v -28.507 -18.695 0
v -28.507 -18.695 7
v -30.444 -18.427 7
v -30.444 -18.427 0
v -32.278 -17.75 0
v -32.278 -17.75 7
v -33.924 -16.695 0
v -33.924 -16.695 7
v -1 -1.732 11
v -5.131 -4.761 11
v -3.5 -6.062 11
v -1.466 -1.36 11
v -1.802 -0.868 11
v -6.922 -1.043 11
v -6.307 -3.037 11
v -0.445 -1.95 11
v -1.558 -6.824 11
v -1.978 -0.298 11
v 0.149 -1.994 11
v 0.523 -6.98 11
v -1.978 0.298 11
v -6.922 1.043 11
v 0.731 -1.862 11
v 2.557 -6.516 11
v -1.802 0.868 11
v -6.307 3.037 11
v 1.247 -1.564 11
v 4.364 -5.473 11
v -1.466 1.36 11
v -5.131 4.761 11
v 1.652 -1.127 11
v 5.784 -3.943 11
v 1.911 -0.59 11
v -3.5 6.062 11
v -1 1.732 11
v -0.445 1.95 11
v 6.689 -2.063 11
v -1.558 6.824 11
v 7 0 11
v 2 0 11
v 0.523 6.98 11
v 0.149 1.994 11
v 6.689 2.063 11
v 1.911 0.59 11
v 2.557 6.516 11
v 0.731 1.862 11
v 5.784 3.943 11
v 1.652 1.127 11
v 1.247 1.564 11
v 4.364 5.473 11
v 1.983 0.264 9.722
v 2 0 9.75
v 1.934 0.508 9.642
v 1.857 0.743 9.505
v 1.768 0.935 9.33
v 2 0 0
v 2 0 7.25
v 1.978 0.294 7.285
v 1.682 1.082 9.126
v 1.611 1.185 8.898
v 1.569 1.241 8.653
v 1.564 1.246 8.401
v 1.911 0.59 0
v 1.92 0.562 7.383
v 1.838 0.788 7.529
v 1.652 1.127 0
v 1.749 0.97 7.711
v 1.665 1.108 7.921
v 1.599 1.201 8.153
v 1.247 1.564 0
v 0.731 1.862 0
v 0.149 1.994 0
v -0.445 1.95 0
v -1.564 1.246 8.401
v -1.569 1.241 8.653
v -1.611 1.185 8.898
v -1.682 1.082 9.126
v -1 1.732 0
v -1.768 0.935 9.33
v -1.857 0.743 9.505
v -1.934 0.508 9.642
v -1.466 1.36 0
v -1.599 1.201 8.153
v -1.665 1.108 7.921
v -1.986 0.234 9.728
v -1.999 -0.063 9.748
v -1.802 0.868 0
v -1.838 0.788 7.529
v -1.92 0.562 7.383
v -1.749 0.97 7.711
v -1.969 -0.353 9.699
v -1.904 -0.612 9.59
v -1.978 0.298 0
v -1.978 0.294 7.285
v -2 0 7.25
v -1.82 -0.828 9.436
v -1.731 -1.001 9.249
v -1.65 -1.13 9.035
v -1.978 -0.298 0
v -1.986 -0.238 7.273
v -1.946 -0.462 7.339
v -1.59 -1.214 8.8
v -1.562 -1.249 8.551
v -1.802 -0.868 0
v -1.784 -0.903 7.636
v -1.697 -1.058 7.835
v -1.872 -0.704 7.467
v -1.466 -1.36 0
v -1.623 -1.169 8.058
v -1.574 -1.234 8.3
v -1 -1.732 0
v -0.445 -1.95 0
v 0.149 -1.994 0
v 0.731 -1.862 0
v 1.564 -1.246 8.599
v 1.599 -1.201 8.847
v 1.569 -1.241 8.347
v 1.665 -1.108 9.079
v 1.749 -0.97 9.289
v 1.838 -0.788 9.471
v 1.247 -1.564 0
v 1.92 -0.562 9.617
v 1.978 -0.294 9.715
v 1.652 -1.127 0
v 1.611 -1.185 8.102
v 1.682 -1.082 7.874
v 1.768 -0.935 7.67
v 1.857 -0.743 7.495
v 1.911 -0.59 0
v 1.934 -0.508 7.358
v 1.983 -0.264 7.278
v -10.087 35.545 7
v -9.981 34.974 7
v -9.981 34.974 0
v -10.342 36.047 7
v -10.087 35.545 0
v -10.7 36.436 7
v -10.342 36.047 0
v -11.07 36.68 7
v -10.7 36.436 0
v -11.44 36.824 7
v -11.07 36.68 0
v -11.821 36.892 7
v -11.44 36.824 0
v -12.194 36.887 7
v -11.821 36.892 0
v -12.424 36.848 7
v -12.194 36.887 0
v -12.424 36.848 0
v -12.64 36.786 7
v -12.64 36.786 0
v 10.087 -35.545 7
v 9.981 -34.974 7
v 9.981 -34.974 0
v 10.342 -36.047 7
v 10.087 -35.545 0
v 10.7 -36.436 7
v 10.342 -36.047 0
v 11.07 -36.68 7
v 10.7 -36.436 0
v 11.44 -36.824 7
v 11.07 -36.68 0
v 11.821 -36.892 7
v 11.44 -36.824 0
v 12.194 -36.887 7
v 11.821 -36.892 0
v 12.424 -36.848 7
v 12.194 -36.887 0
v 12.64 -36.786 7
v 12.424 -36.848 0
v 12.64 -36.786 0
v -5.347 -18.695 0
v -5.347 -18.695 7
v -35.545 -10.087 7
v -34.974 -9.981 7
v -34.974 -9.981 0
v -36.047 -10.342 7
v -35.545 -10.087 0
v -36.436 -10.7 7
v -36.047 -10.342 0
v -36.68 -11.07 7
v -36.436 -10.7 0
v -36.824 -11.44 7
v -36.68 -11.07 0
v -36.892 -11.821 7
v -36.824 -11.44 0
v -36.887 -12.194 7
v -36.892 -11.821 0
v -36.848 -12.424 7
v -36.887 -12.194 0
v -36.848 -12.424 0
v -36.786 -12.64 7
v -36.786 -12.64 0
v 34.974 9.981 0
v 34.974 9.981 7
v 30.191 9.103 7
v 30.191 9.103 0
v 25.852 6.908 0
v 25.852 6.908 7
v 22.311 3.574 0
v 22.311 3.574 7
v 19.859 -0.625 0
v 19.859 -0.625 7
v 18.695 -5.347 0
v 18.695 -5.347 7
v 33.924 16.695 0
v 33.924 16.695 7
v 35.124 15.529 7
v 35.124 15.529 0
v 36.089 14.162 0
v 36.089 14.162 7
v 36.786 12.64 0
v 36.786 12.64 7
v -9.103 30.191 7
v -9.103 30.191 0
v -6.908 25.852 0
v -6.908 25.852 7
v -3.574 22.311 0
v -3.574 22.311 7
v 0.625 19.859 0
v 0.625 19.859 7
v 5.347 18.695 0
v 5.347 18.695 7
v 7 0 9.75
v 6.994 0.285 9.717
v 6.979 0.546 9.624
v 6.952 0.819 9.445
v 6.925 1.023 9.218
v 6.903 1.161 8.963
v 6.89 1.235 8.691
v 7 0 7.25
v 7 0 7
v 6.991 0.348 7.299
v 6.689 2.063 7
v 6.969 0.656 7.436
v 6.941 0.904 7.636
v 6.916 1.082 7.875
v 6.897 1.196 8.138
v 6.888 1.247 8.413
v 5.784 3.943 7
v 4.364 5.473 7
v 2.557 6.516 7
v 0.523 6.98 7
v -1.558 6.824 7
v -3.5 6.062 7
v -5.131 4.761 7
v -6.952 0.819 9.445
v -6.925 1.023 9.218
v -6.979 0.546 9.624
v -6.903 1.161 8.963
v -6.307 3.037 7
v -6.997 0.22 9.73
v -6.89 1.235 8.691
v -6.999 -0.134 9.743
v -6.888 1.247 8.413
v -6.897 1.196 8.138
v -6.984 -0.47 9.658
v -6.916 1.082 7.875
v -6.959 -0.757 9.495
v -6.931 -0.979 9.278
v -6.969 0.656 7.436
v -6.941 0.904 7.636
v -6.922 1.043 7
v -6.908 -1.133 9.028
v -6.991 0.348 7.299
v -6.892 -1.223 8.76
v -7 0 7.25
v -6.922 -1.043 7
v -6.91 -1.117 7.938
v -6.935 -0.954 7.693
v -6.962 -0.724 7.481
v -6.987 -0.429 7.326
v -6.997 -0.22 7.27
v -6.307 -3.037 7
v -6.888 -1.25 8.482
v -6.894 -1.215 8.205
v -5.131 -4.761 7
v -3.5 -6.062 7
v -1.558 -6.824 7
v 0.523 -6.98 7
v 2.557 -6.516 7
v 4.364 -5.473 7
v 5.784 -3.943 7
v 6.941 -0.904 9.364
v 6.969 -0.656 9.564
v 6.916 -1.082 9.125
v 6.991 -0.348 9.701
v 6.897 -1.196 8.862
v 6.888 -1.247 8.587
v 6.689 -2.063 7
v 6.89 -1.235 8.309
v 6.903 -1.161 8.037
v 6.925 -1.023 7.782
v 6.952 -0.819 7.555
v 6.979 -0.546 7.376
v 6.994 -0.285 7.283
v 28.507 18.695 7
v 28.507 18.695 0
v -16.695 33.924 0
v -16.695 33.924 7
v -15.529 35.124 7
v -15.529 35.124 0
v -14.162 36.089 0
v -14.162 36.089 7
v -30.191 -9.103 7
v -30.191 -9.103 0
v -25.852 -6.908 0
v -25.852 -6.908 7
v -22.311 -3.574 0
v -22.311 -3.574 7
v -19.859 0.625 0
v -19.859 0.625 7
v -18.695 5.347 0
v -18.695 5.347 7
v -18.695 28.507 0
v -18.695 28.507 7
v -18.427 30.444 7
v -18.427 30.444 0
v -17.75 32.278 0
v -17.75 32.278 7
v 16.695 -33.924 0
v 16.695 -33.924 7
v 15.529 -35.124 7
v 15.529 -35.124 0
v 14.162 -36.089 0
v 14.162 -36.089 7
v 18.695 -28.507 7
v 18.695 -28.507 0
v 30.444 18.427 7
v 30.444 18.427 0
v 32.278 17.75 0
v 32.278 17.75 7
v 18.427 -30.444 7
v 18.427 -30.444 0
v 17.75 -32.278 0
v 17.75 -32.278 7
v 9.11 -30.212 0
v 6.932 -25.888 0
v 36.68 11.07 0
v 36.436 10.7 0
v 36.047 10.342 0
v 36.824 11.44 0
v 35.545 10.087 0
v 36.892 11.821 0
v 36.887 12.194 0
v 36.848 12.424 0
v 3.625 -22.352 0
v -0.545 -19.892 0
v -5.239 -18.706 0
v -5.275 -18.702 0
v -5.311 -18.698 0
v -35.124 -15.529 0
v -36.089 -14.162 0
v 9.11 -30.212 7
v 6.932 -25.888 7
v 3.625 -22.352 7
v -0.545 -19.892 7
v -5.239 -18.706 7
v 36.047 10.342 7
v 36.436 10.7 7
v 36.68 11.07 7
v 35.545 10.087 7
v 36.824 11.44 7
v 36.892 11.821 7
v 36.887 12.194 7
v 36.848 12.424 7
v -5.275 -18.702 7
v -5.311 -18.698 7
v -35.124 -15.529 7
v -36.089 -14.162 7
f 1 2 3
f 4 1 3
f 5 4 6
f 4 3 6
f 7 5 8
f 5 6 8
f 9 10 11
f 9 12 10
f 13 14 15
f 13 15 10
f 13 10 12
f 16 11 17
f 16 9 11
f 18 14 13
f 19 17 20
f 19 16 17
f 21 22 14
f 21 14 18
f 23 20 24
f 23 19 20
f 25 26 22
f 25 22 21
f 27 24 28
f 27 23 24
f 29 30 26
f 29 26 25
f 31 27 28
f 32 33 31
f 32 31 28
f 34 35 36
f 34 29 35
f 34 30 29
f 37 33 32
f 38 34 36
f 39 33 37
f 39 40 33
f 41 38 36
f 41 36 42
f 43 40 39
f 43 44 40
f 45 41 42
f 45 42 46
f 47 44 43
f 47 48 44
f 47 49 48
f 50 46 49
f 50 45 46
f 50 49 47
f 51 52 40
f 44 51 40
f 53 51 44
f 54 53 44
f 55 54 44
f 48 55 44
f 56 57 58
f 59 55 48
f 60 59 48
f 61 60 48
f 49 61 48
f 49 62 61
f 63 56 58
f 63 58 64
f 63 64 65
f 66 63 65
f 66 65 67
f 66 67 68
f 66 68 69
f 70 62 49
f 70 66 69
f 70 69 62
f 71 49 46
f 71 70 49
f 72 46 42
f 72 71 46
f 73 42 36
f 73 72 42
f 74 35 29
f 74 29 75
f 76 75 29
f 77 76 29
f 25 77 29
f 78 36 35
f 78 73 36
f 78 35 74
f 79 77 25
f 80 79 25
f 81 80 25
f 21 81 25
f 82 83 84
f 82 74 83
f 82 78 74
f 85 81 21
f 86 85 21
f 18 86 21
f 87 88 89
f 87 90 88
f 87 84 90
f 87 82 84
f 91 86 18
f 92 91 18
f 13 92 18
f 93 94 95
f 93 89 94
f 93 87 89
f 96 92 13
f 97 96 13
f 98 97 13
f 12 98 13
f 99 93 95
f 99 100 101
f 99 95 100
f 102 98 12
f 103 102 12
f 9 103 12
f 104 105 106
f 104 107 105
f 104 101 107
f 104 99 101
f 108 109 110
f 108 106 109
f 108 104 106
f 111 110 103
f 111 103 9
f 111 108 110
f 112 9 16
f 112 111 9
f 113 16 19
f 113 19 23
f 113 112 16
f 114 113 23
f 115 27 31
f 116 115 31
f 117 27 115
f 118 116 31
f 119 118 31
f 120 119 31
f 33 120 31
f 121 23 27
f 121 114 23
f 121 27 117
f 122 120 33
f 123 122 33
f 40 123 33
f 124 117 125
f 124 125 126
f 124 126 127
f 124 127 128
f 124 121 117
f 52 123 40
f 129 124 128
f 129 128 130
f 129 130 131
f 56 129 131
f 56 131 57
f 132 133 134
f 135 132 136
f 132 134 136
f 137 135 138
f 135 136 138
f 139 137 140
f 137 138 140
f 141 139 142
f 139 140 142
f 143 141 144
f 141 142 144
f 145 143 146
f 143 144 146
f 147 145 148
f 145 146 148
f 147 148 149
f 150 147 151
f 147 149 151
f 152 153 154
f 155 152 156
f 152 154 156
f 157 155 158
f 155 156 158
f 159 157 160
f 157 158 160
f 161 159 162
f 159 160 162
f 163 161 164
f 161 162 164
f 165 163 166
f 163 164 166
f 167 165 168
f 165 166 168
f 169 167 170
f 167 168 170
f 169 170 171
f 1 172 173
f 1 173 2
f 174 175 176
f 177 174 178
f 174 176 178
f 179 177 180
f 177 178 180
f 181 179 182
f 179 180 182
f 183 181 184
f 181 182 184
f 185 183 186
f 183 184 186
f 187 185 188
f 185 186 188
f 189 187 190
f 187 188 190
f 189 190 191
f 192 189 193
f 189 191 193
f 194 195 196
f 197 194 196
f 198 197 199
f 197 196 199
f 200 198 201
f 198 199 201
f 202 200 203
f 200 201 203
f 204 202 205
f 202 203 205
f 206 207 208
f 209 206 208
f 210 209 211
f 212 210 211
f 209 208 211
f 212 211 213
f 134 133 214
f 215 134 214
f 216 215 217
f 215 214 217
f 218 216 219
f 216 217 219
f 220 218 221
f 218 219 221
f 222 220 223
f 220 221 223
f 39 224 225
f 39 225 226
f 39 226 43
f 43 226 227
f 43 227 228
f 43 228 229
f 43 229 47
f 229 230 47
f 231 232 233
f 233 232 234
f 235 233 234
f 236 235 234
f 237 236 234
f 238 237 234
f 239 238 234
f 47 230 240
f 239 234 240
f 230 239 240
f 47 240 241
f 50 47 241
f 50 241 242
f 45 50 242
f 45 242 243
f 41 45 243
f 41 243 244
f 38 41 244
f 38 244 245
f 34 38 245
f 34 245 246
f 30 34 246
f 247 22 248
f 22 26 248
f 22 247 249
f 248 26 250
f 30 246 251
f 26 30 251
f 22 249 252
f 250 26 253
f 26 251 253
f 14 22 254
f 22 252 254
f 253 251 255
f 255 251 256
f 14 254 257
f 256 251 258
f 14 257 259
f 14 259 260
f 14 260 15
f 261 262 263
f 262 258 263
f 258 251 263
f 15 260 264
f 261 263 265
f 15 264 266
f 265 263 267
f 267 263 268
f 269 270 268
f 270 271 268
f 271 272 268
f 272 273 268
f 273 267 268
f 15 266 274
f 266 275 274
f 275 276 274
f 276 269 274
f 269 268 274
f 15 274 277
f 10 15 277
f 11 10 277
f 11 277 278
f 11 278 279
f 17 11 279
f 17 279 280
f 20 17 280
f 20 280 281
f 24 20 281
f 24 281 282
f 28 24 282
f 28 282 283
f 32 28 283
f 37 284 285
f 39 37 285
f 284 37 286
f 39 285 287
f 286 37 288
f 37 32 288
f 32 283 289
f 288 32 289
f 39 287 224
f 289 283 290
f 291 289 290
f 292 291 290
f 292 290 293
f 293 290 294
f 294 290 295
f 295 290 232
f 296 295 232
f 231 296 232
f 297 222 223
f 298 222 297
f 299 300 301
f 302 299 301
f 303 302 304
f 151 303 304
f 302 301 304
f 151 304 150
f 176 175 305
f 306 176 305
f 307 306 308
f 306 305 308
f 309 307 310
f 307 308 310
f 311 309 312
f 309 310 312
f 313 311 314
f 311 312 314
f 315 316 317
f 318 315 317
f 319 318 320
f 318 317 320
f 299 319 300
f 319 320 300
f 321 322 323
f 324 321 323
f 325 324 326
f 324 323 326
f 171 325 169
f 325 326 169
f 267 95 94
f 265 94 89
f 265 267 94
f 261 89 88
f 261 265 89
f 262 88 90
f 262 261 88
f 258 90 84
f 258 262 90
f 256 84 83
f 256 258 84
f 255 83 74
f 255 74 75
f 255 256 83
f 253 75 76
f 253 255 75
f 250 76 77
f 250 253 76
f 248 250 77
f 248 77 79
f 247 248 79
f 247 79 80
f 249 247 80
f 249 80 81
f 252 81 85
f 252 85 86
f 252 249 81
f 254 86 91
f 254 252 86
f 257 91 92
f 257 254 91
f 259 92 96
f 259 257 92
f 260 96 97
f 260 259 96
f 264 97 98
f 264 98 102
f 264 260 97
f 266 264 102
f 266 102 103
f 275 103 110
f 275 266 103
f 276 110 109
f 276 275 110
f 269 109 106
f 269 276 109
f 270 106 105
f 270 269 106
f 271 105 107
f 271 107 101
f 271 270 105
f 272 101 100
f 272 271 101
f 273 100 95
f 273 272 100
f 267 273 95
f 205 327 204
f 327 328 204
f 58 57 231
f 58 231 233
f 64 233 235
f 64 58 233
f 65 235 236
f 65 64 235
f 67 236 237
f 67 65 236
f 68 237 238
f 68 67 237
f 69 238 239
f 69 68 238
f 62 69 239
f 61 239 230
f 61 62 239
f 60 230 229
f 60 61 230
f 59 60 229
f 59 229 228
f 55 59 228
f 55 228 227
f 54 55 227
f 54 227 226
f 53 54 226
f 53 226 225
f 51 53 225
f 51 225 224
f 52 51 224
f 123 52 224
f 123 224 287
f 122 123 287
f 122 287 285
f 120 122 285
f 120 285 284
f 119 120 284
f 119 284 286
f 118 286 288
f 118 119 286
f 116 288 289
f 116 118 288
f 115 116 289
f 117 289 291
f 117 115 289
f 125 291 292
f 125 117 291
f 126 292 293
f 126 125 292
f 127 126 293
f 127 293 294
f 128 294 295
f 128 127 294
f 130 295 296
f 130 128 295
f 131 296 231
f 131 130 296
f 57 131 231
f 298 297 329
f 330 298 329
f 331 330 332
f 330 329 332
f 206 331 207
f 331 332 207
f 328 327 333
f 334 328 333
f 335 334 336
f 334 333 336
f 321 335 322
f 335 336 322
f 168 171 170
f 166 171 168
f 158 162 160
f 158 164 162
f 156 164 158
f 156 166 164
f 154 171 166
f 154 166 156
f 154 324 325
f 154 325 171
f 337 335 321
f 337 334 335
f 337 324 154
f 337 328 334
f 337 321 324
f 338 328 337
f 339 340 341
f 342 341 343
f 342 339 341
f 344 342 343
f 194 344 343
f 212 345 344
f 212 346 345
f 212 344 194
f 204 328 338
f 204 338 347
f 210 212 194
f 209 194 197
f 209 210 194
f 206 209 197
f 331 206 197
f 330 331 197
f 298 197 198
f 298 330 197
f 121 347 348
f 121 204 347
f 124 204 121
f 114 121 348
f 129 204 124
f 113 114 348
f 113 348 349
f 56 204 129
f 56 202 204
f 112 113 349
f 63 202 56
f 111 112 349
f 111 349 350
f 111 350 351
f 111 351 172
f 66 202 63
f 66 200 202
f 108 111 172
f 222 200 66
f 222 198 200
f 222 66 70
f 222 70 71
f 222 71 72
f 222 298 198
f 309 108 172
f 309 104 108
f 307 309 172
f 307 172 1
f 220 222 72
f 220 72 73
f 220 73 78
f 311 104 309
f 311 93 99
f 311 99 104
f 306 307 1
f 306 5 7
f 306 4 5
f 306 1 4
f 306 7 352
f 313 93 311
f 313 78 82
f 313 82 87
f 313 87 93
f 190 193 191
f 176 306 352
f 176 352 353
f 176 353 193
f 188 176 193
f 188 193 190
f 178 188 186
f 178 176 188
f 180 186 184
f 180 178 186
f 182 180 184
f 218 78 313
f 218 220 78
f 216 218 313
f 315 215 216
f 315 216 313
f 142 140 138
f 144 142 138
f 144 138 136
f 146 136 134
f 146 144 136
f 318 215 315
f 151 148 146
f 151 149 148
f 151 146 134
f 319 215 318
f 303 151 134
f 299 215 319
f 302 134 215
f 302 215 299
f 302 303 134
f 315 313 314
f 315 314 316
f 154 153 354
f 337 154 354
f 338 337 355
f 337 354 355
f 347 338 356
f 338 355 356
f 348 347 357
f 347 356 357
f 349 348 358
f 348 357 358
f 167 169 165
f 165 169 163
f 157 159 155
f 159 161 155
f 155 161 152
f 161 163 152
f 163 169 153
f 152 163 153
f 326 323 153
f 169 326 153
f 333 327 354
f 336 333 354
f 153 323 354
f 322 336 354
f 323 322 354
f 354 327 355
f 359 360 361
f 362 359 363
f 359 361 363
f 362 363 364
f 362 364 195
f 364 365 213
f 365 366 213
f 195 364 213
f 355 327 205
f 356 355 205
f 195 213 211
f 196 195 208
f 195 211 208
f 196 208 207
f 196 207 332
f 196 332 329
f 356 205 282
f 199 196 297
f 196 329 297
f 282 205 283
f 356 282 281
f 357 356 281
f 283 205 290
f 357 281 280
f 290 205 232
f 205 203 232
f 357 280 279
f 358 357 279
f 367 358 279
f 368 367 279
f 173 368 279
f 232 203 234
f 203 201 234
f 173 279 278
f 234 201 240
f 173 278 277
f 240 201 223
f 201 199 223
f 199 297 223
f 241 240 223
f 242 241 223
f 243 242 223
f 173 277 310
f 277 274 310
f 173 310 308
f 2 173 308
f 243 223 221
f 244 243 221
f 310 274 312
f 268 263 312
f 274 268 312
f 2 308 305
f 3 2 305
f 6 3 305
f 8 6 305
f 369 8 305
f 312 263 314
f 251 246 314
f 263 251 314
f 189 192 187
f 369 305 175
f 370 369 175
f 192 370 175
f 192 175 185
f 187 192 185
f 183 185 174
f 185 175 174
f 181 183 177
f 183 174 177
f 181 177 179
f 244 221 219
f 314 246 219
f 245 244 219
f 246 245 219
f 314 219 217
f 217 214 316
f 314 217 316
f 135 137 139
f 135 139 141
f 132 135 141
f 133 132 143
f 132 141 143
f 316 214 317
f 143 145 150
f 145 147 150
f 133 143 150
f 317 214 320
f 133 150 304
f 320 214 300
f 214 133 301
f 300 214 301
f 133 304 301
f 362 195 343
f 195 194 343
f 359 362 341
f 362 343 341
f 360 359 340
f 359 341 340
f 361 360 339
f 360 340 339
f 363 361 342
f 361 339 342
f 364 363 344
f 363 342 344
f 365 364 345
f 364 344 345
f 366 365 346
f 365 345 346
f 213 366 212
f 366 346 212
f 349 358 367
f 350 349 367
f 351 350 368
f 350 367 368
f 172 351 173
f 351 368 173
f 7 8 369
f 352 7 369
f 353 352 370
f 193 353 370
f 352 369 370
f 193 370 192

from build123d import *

# Parameters (mm, degrees)
SKETCH_1_R               = 2
EXTRUDE_1_DEPTH          = 7
SKETCH_5_R               = 7
SKETCH_5_R_2             = 2
EXTRUDE_2_DEPTH          = 4
CUT_EXTRUDE_5_DEPTH      = 8
CUT_EXTRUDE_5_DEPTH_BACK = 15
SKETCH_13_R              = 82.694540834
CUT_EXTRUDE_13_DEPTH     = 10
FILLET_1_R               = 2
FILLET_2_R               = 2
EXTRUDE_5_DEPTH          = 7
CUT_EXTRUDE_14_DEPTH     = 10
FILLET_3_R               = 3
FILLET_4_R               = 1
EXTRUDE_START            = -7
EXTRUDE_6_DEPTH          = 7
SKETCH_18_R              = 47.238796546
CUT_EXTRUDE_15_DEPTH     = 10
FILLET_5_R               = 2


with BuildPart() as part:
    # 草图1 → 凸台-拉伸1 (new body)
    with BuildSketch(Plane.XY):
        with BuildLine():
            ThreePointArc((32.8, 22.894540834), (36.610888994, 26.155959788), (40.879786515, 28.789634497))
            ThreePointArc((40.879786515, 28.789634497), (35.355339059, 35.355339059), (28.789634497, 40.879786515))
            ThreePointArc((28.789634497, 40.879786515), (26.155959788, 36.610888994), (22.894540834, 32.8))
            ThreePointArc((22.894540834, 32.8), (0, 23.316770682), (-22.894540834, 32.8))
            ThreePointArc((-22.894540834, 32.8), (-26.155959788, 36.610888994), (-28.789634497, 40.879786515))
            ThreePointArc((-28.789634497, 40.879786515), (-35.355339059, 35.355339059), (-40.879786515, 28.789634497))
            ThreePointArc((-40.879786515, 28.789634497), (-36.610888994, 26.155959788), (-32.8, 22.894540834))
            ThreePointArc((-32.8, 22.894540834), (-23.316770682, 0), (-32.8, -22.894540834))
            ThreePointArc((-32.8, -22.894540834), (-36.610888994, -26.155959788), (-40.879786515, -28.789634497))
            ThreePointArc((-40.879786515, -28.789634497), (-35.355339059, -35.355339059), (-28.789634497, -40.879786515))
            ThreePointArc((-28.789634497, -40.879786515), (-26.155959788, -36.610888994), (-22.894540834, -32.8))
            ThreePointArc((-22.894540834, -32.8), (0, -23.316770682), (22.894540834, -32.8))
            ThreePointArc((22.894540834, -32.8), (26.155959788, -36.610888994), (28.789634497, -40.879786515))
            ThreePointArc((28.789634497, -40.879786515), (35.355339059, -35.355339059), (40.879786515, -28.789634497))
            ThreePointArc((40.879786515, -28.789634497), (36.610888994, -26.155959788), (32.8, -22.894540834))
            ThreePointArc((32.8, -22.894540834), (23.316770682, 0), (32.8, 22.894540834))
        make_face()
        Circle(SKETCH_1_R, mode=Mode.SUBTRACT)
    extrude(amount=EXTRUDE_1_DEPTH)

    # 草图5 → 凸台-拉伸2 (add)
    with BuildSketch(Plane.XY.offset(7)):
        Circle(SKETCH_5_R)
        Circle(SKETCH_5_R_2, mode=Mode.SUBTRACT)
    extrude(amount=EXTRUDE_2_DEPTH)

    # 草图11 → 切除-拉伸5 (cut, two sides: drawn at the far end of the back side and taken through both)
    with BuildSketch(Plane(origin=(0, 0, 0), x_dir=(0, 0, -1), z_dir=(1, 0, 0)).offset(-CUT_EXTRUDE_5_DEPTH_BACK)):
        with BuildLine():
            ThreePointArc((-9.75, 0), (-8.5, -1.25), (-7.25, 0))
            Line((-7.25, 0), (-9.75, 0))
        make_face()
        with BuildLine():
            Line((-9.75, 0), (-7.25, 0))
            ThreePointArc((-7.25, 0), (-8.5, 1.25), (-9.75, 0))
        make_face()
    extrude(amount=CUT_EXTRUDE_5_DEPTH + CUT_EXTRUDE_5_DEPTH_BACK, mode=Mode.SUBTRACT)

    # 草图13 → 切除-拉伸13 (cut)
    with BuildSketch(Plane(origin=(0, 0, 0), x_dir=(-1, 0, 0), z_dir=(0, 0, -1))):
        Circle(SKETCH_13_R)
        with BuildLine():
            ThreePointArc((-25.243635923, 31.028355505), (0, 18.694540834), (25.243635923, 31.028355505))
            ThreePointArc((25.243635923, 31.028355505), (28.284271247, 28.284271247), (31.028355505, 25.243635923))
            ThreePointArc((31.028355505, 25.243635923), (18.694540834, 0), (31.028355505, -25.243635923))
            ThreePointArc((31.028355505, -25.243635923), (28.284271247, -28.284271247), (25.243635923, -31.028355505))
            ThreePointArc((25.243635923, -31.028355505), (0, -18.694540834), (-25.243635923, -31.028355505))
            ThreePointArc((-25.243635923, -31.028355505), (-28.284271247, -28.284271247), (-31.028355505, -25.243635923))
            ThreePointArc((-31.028355505, -25.243635923), (-18.694540834, 0), (-31.028355505, 25.243635923))
            ThreePointArc((-31.028355505, 25.243635923), (-28.284271247, 28.284271247), (-25.243635923, 31.028355505))
        make_face(mode=Mode.SUBTRACT)
    extrude(amount=-CUT_EXTRUDE_13_DEPTH, mode=Mode.SUBTRACT)

    # 圆角1
    fillet_1_edges = [part.edges().sort_by_distance(p)[0] for p in [
        (25.243635923, 31.028355505, 3.5),
        (-31.028355505, 25.243635923, 3.5),
        (-31.028355505, -25.243635923, 3.5),
        (31.028355505, -25.243635923, 3.5),
    ]]
    fillet(fillet_1_edges, radius=FILLET_1_R)

    # 圆角2
    fillet_2_edges = [part.edges().sort_by_distance(p)[0] for p in [
        (-25.243635923, 31.028355505, 3.5),
        (-25.243635923, -31.028355505, 3.5),
        (25.243635923, -31.028355505, 3.5),
        (31.028355505, 25.243635923, 3.5),
    ]]
    fillet(fillet_2_edges, radius=FILLET_2_R)

    # 草图14 → 凸台-拉伸5 (add)
    with BuildSketch(Plane(origin=(0, 0, 0), x_dir=(-1, 0, 0), z_dir=(0, 0, -1))):
        with BuildLine():
            ThreePointArc((13.801737807, 34.095635208), (10.090539986, 23.536654529), (0, 18.694540834))
            ThreePointArc((0, 18.694540834), (9.821274778, 20.238957409), (18.694540834, 24.723130726))
            Line((18.694540834, 24.723130726), (18.694540834, 34.095635208))
            Line((18.694540834, 34.095635208), (13.801737807, 34.095635208))
        make_face()
        with BuildLine():
            ThreePointArc((-18.694540834, 0), (-20.238957409, 9.821274778), (-24.723130726, 18.694540834))
            Line((-24.723130726, 18.694540834), (-34.095635208, 18.694540834))
            Line((-34.095635208, 18.694540834), (-34.095635208, 13.801737807))
            ThreePointArc((-34.095635208, 13.801737807), (-23.536654529, 10.090539986), (-18.694540834, 0))
        make_face()
        with BuildLine():
            ThreePointArc((34.095635208, -13.801737807), (23.536654529, -10.090539986), (18.694540834, 0))
            ThreePointArc((18.694540834, 0), (20.238957409, -9.821274778), (24.723130726, -18.694540834))
            Line((24.723130726, -18.694540834), (34.095635208, -18.694540834))
            Line((34.095635208, -18.694540834), (34.095635208, -13.801737807))
        make_face()
        with BuildLine():
            ThreePointArc((0, -18.694540834), (-9.821274778, -20.238957409), (-18.694540834, -24.723130726))
            Line((-18.694540834, -24.723130726), (-18.694540834, -34.095635208))
            Line((-18.694540834, -34.095635208), (-13.801737807, -34.095635208))
            ThreePointArc((-13.801737807, -34.095635208), (-10.090539986, -23.536654529), (0, -18.694540834))
        make_face()
    extrude(amount=-EXTRUDE_5_DEPTH)

    # 草图15 → 切除-拉伸14 (cut)
    with BuildSketch(Plane(origin=(0, 0, 0), x_dir=(-1, 0, 0), z_dir=(0, 0, -1))):
        with BuildLine():
            Line((-24.723130726, 18.694540834), (-33.334723843, 25.692106251))
            Line((-33.334723843, 25.692106251), (-12.530174443, 42.497606237))
            Line((-12.530174443, 42.497606237), (0, 18.694540834))
            ThreePointArc((0, 18.694540834), (-13.155803158, 21.523924741), (-23.985180208, 29.51173813))
            ThreePointArc((-23.985180208, 29.51173813), (-25.372019669, 30.184661343), (-26.825530496, 29.671382064))
            ThreePointArc((-26.825530496, 29.671382064), (-28.284271247, 28.284271247), (-29.671382064, 26.825530496))
            ThreePointArc((-29.671382064, 26.825530496), (-30.184661343, 25.372019669), (-29.51173813, 23.985180208))
            ThreePointArc((-29.51173813, 23.985180208), (-26.969497889, 21.473759272), (-24.723130726, 18.694540834))
        make_face()
        with BuildLine():
            Line((-24.723130726, 18.694540834), (0, 18.694540834))
            ThreePointArc((0, 18.694540834), (-13.155803158, 21.523924741), (-23.985180208, 29.51173813))
            ThreePointArc((-23.985180208, 29.51173813), (-25.372019669, 30.184661343), (-26.825530496, 29.671382064))
            ThreePointArc((-26.825530496, 29.671382064), (-28.284271247, 28.284271247), (-29.671382064, 26.825530496))
            ThreePointArc((-29.671382064, 26.825530496), (-30.184661343, 25.372019669), (-29.51173813, 23.985180208))
            ThreePointArc((-29.51173813, 23.985180208), (-26.969497889, 21.473759272), (-24.723130726, 18.694540834))
        make_face()
        with BuildLine():
            Line((18.694540834, 0), (18.694540834, 24.723130726))
            ThreePointArc((18.694540834, 24.723130726), (21.473759272, 26.969497889), (23.985180208, 29.51173813))
            ThreePointArc((23.985180208, 29.51173813), (25.372019669, 30.184661343), (26.825530496, 29.671382064))
            ThreePointArc((26.825530496, 29.671382064), (28.284271247, 28.284271247), (29.671382064, 26.825530496))
            ThreePointArc((29.671382064, 26.825530496), (30.184661343, 25.372019669), (29.51173813, 23.985180208))
            ThreePointArc((29.51173813, 23.985180208), (21.523924741, 13.155803158), (18.694540834, 0))
        make_face()
        with BuildLine():
            Line((18.694540834, 24.723130726), (25.692106251, 33.334723843))
            Line((25.692106251, 33.334723843), (42.497606237, 12.530174443))
            Line((42.497606237, 12.530174443), (18.694540834, 0))
            ThreePointArc((18.694540834, 0), (21.523924741, 13.155803158), (29.51173813, 23.985180208))
            ThreePointArc((29.51173813, 23.985180208), (30.184661343, 25.372019669), (29.671382064, 26.825530496))
            ThreePointArc((29.671382064, 26.825530496), (28.284271247, 28.284271247), (26.825530496, 29.671382064))
            ThreePointArc((26.825530496, 29.671382064), (25.372019669, 30.184661343), (23.985180208, 29.51173813))
            ThreePointArc((23.985180208, 29.51173813), (21.473759272, 26.969497889), (18.694540834, 24.723130726))
        make_face()
        with BuildLine():
            ThreePointArc((29.51173813, -23.985180208), (26.969497889, -21.473759272), (24.723130726, -18.694540834))
            Line((24.723130726, -18.694540834), (0.927061706, -18.707972456))
            ThreePointArc((0.927061706, -18.707972456), (13.577013202, -21.717572178), (23.985180208, -29.51173813))
            ThreePointArc((23.985180208, -29.51173813), (25.372019669, -30.184661343), (26.825530496, -29.671382064))
            ThreePointArc((26.825530496, -29.671382064), (28.284271247, -28.284271247), (29.671382064, -26.825530496))
            ThreePointArc((29.671382064, -26.825530496), (30.184661343, -25.372019669), (29.51173813, -23.985180208))
        make_face()
        with BuildLine():
            Line((24.723130726, -18.694540834), (33.334723843, -25.692106251))
            Line((33.334723843, -25.692106251), (12.530174443, -42.497606237))
            Line((12.530174443, -42.497606237), (0, -18.694540834))
            ThreePointArc((0, -18.694540834), (13.155803158, -21.523924741), (23.985180208, -29.51173813))
            ThreePointArc((23.985180208, -29.51173813), (25.372019669, -30.184661343), (26.825530496, -29.671382064))
            ThreePointArc((26.825530496, -29.671382064), (28.284271247, -28.284271247), (29.671382064, -26.825530496))
            ThreePointArc((29.671382064, -26.825530496), (30.184661343, -25.372019669), (29.51173813, -23.985180208))
            ThreePointArc((29.51173813, -23.985180208), (26.969497889, -21.473759272), (24.723130726, -18.694540834))
        make_face()
        with BuildLine():
            Line((-42.497606237, -12.530174443), (-18.694540834, 0))
            ThreePointArc((-18.694540834, 0), (-21.523924741, -13.155803158), (-29.51173813, -23.985180208))
            ThreePointArc((-29.51173813, -23.985180208), (-30.184661343, -25.372019669), (-29.671382064, -26.825530496))
            ThreePointArc((-29.671382064, -26.825530496), (-28.284271247, -28.284271247), (-26.825530496, -29.671382064))
            ThreePointArc((-26.825530496, -29.671382064), (-25.372019669, -30.184661343), (-23.985180208, -29.51173813))
            ThreePointArc((-23.985180208, -29.51173813), (-21.473759272, -26.969497889), (-18.694540834, -24.723130726))
            Line((-18.694540834, -24.723130726), (-25.692106251, -33.334723843))
            Line((-25.692106251, -33.334723843), (-42.497606237, -12.530174443))
        make_face()
        with BuildLine():
            Line((-18.694540834, -24.723130726), (-18.694540834, 0))
            ThreePointArc((-18.694540834, 0), (-21.523924741, -13.155803158), (-29.51173813, -23.985180208))
            ThreePointArc((-29.51173813, -23.985180208), (-30.184661343, -25.372019669), (-29.671382064, -26.825530496))
            ThreePointArc((-29.671382064, -26.825530496), (-28.284271247, -28.284271247), (-26.825530496, -29.671382064))
            ThreePointArc((-26.825530496, -29.671382064), (-25.372019669, -30.184661343), (-23.985180208, -29.51173813))
            ThreePointArc((-23.985180208, -29.51173813), (-21.473759272, -26.969497889), (-18.694540834, -24.723130726))
        make_face()
    extrude(amount=-CUT_EXTRUDE_14_DEPTH, mode=Mode.SUBTRACT)

    # 圆角3
    fillet_3_edges = [part.edges().sort_by_distance(p)[0] for p in [
        (34.095635208, 18.694540834, 3.5),
        (-18.694540834, 34.095635208, 3.5),
        (-34.095635208, -18.694540834, 3.5),
        (18.694540834, -34.095635208, 3.5),
    ]]
    fillet(fillet_3_edges, radius=FILLET_3_R)

    # 圆角4
    fillet_4_edges = [part.edges().sort_by_distance(p)[0] for p in [
        (-13.801737807, 34.095635208, 3.5),
        (-34.095635208, -13.801737807, 3.5),
        (13.801737807, -34.095635208, 3.5),
        (34.095635208, 13.801737807, 3.5),
    ]]
    fillet(fillet_4_edges, radius=FILLET_4_R)

    # 草图16 → 凸台-拉伸6 (add)
    with BuildSketch(Plane(origin=(0, 0, 0), x_dir=(-1, 0, 0), z_dir=(0, 0, -1)).offset(EXTRUDE_START)):
        with BuildLine():
            ThreePointArc((9.910873566, 37.290487321), (6.133427391, 24.832564637), (-5.346712023, 18.694540834))
            Line((-5.346712023, 18.694540834), (0, 18.694540834))
            ThreePointArc((0, 18.694540834), (9.754847949, 23.174553207), (13.822417362, 33.108457194))
            ThreePointArc((13.822417362, 33.108457194), (14.119776258, 33.807260807), (14.822335157, 34.095635208))
            Line((14.822335157, 34.095635208), (15.694540834, 34.095635208))
            ThreePointArc((15.694540834, 34.095635208), (16.201960761, 34.052411326), (16.694758916, 33.923985219))
            ThreePointArc((16.694758916, 33.923985219), (13.671949052, 36.351080947), (9.910873566, 37.290487321))
        make_face()
        with BuildLine():
            ThreePointArc((-37.290487321, 9.910873566), (-24.832564637, 6.133427391), (-18.694540834, -5.346712023))
            Line((-18.694540834, -5.346712023), (-18.694540834, 0))
            ThreePointArc((-18.694540834, 0), (-23.174553207, 9.754847949), (-33.108457194, 13.822417362))
            ThreePointArc((-33.108457194, 13.822417362), (-33.807260807, 14.119776258), (-34.095635208, 14.822335157))
            Line((-34.095635208, 14.822335157), (-34.095635208, 15.694540834))
            ThreePointArc((-34.095635208, 15.694540834), (-34.052411326, 16.201960761), (-33.923985219, 16.694758916))
            ThreePointArc((-33.923985219, 16.694758916), (-36.351080947, 13.671949052), (-37.290487321, 9.910873566))
        make_face()
        with BuildLine():
            ThreePointArc((-9.910873566, -37.290487321), (-6.167788996, -24.874581099), (5.238714674, -18.705538756))
            Line((5.238714674, -18.705538756), (0.927061706, -18.707972456))
            ThreePointArc((0.927061706, -18.707972456), (0.463579501, -18.697898916), (0, -18.694540834))
            ThreePointArc((0, -18.694540834), (-9.754847949, -23.174553207), (-13.822417362, -33.108457194))
            ThreePointArc((-13.822417362, -33.108457194), (-14.119776258, -33.807260807), (-14.822335157, -34.095635208))
            Line((-14.822335157, -34.095635208), (-15.694540834, -34.095635208))
            ThreePointArc((-15.694540834, -34.095635208), (-16.201960761, -34.052411326), (-16.694758916, -33.923985219))
            ThreePointArc((-16.694758916, -33.923985219), (-13.671949052, -36.351080947), (-9.910873566, -37.290487321))
        make_face()
        with BuildLine():
            ThreePointArc((37.290487321, -9.910873566), (24.832564637, -6.133427391), (18.694540834, 5.346712023))
            Line((18.694540834, 5.346712023), (18.694540834, 0))
            ThreePointArc((18.694540834, 0), (23.174553207, -9.754847949), (33.108457194, -13.822417362))
            ThreePointArc((33.108457194, -13.822417362), (33.807260807, -14.119776258), (34.095635208, -14.822335157))
            Line((34.095635208, -14.822335157), (34.095635208, -15.694540834))
            ThreePointArc((34.095635208, -15.694540834), (34.052411326, -16.201960761), (33.923985219, -16.694758916))
            ThreePointArc((33.923985219, -16.694758916), (36.351080947, -13.671949052), (37.290487321, -9.910873566))
        make_face()
    extrude(amount=EXTRUDE_6_DEPTH)

    # 草图18 → 切除-拉伸15 (cut)
    with BuildSketch(Plane.XY.offset(7)):
        Circle(SKETCH_18_R)
        with BuildLine():
            Line((5.346712023, 18.694540834), (27.984188654, 18.694540834))
            ThreePointArc((27.984188654, 18.694540834), (34.456495042, 16.230104762), (37.290487321, 9.910873566))
            ThreePointArc((37.290487321, 9.910873566), (24.832564637, 6.133427391), (18.694540834, -5.346712023))
            Line((18.694540834, -5.346712023), (18.694540834, -27.984188654))
            ThreePointArc((18.694540834, -27.984188654), (16.230104762, -34.456495042), (9.910873566, -37.290487321))
            ThreePointArc((9.910873566, -37.290487321), (6.133427391, -24.832564637), (-5.346712023, -18.694540834))
            Line((-5.346712023, -18.694540834), (-27.984188654, -18.694540834))
            ThreePointArc((-27.984188654, -18.694540834), (-34.456495042, -16.230104762), (-37.290487321, -9.910873566))
            ThreePointArc((-37.290487321, -9.910873566), (-24.832564637, -6.133427391), (-18.694540834, 5.346712023))
            Line((-18.694540834, 5.346712023), (-18.694540834, 27.984188654))
            ThreePointArc((-18.694540834, 27.984188654), (-16.230104762, 34.456495042), (-9.910873566, 37.290487321))
            ThreePointArc((-9.910873566, 37.290487321), (-6.133427391, 24.832564637), (5.346712023, 18.694540834))
        make_face(mode=Mode.SUBTRACT)
    extrude(amount=-CUT_EXTRUDE_15_DEPTH, mode=Mode.SUBTRACT)

    # 圆角5
    fillet_5_edges = [part.edges().sort_by_distance(p)[0] for p in [
        (-9.910873566, 37.290487321, 3.5),
        (37.290487321, 9.910873566, 3.5),
        (9.910873566, -37.290487321, 3.5),
        (-37.290487321, -9.910873566, 3.5),
    ]]
    fillet(fillet_5_edges, radius=FILLET_5_R)


solid = part.part
